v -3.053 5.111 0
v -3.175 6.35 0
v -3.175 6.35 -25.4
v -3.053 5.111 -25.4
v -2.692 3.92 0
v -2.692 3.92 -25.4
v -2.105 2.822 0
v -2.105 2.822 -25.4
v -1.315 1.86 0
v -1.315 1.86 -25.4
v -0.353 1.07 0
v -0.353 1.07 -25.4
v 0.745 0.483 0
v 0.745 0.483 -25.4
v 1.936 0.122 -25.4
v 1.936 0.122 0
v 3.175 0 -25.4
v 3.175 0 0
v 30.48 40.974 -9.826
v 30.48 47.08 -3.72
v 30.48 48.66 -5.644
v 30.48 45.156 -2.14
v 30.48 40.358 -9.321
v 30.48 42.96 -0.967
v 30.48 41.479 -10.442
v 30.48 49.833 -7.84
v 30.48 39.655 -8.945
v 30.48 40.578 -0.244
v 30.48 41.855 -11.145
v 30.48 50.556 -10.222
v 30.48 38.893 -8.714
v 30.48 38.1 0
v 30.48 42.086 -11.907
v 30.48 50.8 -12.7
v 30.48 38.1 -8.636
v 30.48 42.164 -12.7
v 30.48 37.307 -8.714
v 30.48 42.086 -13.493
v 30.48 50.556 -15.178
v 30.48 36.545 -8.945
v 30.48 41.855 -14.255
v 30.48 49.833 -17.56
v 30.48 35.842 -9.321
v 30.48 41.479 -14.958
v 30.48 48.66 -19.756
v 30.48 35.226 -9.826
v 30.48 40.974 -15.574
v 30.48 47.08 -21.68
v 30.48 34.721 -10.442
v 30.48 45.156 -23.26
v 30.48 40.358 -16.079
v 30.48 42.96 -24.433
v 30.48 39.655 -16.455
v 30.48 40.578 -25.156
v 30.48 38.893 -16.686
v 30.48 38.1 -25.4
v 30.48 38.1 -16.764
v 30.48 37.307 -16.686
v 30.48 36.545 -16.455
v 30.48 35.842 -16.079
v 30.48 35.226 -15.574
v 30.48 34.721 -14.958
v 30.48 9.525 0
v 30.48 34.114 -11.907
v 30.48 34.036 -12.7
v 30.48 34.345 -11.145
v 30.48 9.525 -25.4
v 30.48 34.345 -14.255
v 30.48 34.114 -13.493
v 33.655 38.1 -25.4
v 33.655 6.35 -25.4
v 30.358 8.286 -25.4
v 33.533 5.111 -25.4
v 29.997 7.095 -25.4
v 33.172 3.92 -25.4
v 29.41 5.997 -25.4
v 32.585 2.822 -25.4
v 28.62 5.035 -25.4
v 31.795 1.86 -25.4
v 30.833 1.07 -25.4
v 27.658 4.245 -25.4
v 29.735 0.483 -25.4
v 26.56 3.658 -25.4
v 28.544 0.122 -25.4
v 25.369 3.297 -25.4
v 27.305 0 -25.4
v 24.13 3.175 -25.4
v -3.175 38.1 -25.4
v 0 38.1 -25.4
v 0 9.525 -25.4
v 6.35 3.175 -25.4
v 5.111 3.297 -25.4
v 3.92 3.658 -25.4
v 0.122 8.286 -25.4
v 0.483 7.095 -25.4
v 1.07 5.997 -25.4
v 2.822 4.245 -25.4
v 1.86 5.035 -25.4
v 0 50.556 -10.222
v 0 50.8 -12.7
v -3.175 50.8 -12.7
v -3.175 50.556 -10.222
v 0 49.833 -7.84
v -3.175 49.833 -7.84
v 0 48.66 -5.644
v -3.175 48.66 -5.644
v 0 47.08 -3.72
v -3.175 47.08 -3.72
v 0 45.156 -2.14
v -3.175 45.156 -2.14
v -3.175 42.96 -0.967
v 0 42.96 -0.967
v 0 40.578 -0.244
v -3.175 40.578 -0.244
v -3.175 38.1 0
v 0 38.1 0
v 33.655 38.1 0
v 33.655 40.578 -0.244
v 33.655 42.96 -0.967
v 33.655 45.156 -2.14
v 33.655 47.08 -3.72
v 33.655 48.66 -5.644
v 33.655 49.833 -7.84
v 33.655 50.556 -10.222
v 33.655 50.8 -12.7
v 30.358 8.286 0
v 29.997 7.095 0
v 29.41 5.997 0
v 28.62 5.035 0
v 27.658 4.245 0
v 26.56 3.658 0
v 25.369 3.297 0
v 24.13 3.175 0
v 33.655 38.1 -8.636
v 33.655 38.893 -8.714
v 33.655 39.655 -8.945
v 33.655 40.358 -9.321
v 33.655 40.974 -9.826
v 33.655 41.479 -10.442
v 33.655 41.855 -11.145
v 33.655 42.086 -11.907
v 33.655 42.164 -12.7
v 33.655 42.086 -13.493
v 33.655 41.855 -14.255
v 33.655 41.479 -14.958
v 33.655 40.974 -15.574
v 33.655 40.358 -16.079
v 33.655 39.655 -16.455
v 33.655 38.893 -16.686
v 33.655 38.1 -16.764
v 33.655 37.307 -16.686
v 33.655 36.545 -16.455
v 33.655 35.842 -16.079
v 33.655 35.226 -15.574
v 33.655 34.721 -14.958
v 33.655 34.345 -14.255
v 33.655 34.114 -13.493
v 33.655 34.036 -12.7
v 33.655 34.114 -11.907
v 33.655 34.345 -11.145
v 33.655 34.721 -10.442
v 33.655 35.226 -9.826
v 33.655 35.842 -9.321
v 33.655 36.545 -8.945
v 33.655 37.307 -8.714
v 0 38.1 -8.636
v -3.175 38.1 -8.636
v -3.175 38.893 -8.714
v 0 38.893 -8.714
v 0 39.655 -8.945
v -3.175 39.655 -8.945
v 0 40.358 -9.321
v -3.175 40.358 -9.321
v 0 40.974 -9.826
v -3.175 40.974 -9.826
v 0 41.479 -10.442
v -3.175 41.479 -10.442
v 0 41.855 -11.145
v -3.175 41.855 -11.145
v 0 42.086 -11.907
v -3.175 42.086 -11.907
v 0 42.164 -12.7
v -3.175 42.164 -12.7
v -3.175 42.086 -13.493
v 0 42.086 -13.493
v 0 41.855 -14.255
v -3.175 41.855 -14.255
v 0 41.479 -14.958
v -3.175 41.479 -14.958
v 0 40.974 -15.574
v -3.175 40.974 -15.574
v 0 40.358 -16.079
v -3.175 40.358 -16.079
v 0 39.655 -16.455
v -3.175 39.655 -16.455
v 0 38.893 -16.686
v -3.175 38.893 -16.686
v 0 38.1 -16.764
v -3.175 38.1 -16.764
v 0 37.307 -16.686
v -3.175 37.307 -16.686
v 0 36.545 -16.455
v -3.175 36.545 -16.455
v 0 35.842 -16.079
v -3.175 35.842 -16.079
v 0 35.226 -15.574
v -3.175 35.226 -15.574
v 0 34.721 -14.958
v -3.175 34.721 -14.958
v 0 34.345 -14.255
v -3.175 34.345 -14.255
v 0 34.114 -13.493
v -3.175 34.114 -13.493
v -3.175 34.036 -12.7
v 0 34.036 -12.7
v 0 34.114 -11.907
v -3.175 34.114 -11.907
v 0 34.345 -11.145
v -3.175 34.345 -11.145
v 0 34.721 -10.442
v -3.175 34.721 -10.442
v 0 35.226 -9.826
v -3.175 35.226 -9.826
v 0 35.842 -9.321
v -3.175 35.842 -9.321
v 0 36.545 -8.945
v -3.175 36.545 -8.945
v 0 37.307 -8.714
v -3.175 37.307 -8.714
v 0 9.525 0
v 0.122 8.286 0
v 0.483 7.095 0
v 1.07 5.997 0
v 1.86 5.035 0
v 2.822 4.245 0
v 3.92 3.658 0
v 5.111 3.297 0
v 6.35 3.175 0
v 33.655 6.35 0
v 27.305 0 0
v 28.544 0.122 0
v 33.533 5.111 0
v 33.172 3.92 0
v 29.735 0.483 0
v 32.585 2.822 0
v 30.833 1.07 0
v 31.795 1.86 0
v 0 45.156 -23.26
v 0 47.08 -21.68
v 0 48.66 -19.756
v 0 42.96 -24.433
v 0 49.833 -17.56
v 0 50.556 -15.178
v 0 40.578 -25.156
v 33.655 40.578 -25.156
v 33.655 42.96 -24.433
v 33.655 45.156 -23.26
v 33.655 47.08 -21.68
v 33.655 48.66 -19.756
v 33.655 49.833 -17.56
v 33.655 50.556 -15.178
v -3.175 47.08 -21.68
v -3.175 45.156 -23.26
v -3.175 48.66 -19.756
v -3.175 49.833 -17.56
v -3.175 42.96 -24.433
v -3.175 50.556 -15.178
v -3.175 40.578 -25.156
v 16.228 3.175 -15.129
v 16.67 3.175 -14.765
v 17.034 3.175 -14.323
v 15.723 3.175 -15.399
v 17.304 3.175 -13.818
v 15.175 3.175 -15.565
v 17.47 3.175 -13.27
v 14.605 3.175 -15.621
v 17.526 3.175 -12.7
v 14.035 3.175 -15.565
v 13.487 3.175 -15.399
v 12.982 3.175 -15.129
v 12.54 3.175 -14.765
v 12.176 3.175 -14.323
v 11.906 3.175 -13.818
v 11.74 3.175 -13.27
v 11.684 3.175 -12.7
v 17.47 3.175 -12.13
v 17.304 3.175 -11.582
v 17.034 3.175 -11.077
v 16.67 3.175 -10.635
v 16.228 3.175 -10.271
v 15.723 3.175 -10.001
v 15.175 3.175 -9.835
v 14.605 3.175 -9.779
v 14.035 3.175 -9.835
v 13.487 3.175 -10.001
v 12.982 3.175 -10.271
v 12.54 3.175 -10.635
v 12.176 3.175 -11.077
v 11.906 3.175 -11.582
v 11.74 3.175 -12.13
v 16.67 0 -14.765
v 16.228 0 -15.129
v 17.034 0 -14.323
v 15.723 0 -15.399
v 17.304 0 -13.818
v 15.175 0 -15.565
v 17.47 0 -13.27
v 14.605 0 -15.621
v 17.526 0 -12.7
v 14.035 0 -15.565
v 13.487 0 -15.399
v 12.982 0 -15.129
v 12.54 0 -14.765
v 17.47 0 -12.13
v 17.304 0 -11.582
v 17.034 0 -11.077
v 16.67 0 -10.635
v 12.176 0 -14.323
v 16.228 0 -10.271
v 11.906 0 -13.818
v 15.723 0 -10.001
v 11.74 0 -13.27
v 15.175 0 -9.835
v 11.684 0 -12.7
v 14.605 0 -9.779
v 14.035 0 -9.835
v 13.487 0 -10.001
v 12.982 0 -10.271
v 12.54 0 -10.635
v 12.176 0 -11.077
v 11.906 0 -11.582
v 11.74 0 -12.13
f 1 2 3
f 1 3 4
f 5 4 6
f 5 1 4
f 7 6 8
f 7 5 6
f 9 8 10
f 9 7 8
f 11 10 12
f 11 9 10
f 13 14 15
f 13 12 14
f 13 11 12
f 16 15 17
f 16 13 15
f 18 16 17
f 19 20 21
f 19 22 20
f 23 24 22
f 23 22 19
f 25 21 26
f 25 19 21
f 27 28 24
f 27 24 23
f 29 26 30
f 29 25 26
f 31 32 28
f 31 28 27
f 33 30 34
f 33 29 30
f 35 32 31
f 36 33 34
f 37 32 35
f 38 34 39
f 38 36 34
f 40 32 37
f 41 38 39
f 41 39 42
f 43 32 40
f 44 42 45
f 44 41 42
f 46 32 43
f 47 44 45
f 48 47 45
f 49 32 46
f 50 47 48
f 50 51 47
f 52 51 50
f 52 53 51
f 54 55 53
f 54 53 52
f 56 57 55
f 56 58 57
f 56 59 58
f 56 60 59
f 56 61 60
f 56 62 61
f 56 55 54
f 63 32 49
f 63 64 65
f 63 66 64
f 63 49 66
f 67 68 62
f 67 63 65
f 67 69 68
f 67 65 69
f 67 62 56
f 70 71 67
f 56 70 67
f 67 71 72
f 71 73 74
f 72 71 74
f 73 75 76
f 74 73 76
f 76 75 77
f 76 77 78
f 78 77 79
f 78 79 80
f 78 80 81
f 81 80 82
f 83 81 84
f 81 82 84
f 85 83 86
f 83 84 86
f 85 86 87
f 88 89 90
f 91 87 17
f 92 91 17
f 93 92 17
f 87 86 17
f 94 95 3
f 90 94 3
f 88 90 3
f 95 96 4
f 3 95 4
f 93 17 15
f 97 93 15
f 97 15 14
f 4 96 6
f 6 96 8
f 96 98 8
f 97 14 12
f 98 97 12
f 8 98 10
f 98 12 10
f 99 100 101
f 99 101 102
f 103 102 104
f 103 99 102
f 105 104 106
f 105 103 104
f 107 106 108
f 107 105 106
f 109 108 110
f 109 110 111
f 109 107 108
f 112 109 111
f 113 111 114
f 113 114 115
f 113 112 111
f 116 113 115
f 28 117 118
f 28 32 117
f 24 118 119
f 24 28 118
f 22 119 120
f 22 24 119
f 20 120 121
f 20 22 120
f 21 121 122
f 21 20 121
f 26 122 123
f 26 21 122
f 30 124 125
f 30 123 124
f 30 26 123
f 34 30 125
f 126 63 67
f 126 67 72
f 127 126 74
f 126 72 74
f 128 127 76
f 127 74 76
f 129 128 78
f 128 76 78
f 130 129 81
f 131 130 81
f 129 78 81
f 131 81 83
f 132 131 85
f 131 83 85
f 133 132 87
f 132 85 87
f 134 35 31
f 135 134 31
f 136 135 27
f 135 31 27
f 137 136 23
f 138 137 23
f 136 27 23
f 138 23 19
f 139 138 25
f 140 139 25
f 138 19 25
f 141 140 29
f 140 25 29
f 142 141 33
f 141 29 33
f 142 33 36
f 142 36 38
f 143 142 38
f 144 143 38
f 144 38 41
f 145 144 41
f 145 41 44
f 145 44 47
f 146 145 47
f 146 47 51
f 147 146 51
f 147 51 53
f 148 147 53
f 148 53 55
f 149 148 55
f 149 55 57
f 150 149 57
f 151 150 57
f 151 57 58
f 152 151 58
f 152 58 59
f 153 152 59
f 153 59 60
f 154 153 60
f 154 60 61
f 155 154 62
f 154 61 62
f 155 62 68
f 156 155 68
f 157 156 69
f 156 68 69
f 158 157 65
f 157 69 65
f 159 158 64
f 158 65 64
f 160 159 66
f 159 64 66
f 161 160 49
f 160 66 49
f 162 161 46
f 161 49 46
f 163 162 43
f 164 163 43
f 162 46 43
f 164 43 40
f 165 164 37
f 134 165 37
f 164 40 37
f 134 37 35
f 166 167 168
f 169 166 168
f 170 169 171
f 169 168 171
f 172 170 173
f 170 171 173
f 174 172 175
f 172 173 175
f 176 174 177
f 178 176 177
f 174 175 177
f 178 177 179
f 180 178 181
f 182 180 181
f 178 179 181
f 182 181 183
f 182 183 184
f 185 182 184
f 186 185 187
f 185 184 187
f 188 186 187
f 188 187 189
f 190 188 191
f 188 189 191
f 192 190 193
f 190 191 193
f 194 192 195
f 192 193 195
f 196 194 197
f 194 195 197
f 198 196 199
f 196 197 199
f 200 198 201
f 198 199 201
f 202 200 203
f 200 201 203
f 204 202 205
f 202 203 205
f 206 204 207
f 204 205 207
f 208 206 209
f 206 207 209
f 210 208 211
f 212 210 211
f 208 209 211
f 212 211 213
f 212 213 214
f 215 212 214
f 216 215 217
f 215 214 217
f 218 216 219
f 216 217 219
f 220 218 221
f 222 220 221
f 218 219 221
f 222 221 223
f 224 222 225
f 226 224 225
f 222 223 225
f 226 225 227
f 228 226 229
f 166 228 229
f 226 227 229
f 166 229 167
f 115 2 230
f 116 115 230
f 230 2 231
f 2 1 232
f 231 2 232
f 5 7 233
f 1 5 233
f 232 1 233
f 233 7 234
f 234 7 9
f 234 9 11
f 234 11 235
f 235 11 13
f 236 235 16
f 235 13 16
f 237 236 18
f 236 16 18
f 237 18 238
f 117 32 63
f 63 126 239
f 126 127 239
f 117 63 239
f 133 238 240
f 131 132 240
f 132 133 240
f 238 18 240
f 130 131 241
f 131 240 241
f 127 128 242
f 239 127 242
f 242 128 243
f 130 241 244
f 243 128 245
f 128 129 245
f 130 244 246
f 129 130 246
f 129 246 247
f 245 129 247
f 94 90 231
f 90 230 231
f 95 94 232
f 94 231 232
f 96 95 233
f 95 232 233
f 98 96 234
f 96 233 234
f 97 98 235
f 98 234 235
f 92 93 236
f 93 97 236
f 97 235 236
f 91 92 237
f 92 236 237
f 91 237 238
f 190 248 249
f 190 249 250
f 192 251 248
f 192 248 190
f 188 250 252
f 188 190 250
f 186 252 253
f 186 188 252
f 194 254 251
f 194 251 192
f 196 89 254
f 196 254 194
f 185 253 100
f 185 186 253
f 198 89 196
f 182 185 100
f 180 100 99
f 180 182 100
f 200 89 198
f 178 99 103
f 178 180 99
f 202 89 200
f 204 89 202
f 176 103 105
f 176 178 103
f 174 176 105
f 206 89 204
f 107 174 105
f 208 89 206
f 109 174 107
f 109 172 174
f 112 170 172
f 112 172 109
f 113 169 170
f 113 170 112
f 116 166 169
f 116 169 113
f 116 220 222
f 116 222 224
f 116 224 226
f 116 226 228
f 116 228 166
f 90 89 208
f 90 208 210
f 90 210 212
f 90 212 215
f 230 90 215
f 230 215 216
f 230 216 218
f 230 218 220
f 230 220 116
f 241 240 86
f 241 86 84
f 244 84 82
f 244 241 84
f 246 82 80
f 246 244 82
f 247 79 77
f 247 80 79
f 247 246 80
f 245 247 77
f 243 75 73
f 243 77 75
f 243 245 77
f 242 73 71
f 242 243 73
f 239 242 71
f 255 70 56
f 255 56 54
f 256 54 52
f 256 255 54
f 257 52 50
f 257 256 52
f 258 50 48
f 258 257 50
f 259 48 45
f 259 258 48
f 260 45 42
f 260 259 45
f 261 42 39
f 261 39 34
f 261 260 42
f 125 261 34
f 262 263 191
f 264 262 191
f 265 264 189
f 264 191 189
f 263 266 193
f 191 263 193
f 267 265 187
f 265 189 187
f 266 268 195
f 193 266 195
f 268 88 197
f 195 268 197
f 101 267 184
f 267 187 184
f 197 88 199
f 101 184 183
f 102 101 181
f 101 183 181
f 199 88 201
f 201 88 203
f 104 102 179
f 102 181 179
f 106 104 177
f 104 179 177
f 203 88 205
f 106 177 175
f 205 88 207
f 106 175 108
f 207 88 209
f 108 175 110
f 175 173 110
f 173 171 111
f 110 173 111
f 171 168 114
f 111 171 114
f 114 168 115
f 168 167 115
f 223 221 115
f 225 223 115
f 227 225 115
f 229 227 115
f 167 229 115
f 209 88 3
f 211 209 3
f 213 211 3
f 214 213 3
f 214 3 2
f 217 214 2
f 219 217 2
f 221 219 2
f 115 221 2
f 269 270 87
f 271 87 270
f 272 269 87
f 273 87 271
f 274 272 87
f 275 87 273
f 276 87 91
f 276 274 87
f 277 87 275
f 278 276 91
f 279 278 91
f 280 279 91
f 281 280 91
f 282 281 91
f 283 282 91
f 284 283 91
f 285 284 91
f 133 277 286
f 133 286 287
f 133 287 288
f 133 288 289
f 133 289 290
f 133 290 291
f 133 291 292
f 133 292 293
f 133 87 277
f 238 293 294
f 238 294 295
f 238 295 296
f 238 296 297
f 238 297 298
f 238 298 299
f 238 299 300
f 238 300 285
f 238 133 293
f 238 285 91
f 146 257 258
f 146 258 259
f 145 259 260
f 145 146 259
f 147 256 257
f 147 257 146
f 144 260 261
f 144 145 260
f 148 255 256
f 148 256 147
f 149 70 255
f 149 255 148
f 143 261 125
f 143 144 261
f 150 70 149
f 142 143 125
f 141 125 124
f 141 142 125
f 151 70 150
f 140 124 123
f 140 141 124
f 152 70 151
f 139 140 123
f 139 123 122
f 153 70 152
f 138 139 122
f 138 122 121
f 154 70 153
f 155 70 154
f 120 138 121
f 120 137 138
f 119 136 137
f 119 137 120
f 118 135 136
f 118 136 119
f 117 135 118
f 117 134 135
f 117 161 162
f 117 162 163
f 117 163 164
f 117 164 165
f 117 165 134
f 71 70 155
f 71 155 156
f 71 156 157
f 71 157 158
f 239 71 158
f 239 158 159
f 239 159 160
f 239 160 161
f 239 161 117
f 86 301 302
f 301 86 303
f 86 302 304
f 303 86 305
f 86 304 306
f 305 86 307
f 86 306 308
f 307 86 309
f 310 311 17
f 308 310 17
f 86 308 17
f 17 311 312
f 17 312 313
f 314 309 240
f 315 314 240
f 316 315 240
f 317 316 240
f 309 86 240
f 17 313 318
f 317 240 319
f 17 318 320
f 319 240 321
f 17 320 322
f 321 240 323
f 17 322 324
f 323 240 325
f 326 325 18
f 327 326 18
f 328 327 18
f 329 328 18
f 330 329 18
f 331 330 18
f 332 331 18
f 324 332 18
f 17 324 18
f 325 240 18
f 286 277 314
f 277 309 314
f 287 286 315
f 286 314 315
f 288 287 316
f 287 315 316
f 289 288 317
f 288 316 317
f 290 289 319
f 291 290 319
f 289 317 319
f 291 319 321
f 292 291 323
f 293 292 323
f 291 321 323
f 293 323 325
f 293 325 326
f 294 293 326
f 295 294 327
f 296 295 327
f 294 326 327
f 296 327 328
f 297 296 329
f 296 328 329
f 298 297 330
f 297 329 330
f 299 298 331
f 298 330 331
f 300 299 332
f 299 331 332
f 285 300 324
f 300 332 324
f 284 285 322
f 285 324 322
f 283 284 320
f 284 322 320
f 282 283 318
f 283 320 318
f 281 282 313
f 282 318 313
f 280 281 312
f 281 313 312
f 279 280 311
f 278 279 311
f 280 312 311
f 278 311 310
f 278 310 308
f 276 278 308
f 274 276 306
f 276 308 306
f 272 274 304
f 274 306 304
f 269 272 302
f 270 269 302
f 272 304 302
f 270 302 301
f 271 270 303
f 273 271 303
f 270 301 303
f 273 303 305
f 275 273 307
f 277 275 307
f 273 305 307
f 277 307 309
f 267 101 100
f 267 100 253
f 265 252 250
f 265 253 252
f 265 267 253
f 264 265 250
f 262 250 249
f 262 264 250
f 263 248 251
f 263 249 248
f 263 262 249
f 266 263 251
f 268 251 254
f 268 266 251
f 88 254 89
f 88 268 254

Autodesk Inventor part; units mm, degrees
ref_plane "YZ Plane" through (0, 0, 0) normal (1, 0, 0) x (0, 1, 0)
ref_plane "XZ Plane" through (0, 0, 0) normal (0, 1, 0) x (-1, 0, 0)
ref_plane "XY Plane" through (0, 0, 0) normal (0, 0, 1) x (1, 0, 0)
sketch "Sketch1" plane through (0, 0, 0) normal (0, 1, 0) x (-1, 0, 0)
  line L0 (0, 0) -> (-30.48, 0)
  line L1 (-30.48, 0) -> (-30.48, -25.4)
  line L2 (-30.48, -25.4) -> (0, -25.4)
  line L3 (0, -25.4) -> (0, 0)
  line L4 (0, -25.4) -> (3.175, -25.4)
  line L5 (3.175, -25.4) -> (3.175, 0)
  line L6 (3.175, 0) -> (0, 0)
  line L7 (0, 0) -> (0, -25.4)
  line L8 (-30.48, -25.4) -> (-33.655, -25.4)
  line L9 (-33.655, -25.4) -> (-33.655, 0)
  line L10 (-33.655, 0) -> (-30.48, 0)
  line L11 (-30.48, 0) -> (-30.48, -25.4)
  dimension "d0" = 30.48
  dimension "d1" = 25.4
  dimension "d2" = 3.175
  dimension "d3" = 3.175
extrude "Extrusion1" add sketch "Sketch1" along normal blind 3.175 contours L3 L2 L1 L0
extrude "Extrusion2" add sketch "Sketch1" along normal blind 50.8 contours L6 L5 L4 L3 | L1 L8 L9 L10
sketch "Sketch2" plane through (-3.175, 0, -25.4) normal (-1, 0, 0) x (0, 0, 1)
  circle A0 centre (12.7, 38.1) radius 4.064
  line L0 (0, 50.8) -> (25.4, 50.8) projected
  line L1 (12.7, 38.1) -> (0, 38.1) construction
  line L2 (12.7, 38.1) -> (25.4, 38.1) construction
  point P0 (25.4, 0)
  dimension "d8" = 8.128
  dimension "d9" = 12.7
extrude "Extrusion3" cut sketch "Sketch2" against normal through all
fillet "Fillet1" radius 12.7 4 edges at (-1.5875, 50.8, 0) (32.0675, 50.8, 0) (32.0675, 50.8, -25.4) (-1.5875, 50.8, -25.4)
fillet "Fillet2" radius 6.35 4 edges at (-3.175, 0, -12.7) (0, 3.175, -12.7) (30.48, 3.175, -12.7) (33.655, 0, -12.7)
sketch "Sketch3" plane through (0, 0, 0) normal (0, -1, 0) x (1, 0, 0)
  circle A0 centre (14.605, -12.7) radius 2.921
  line L0 (14.605, -12.7) -> (1.905, -12.7) construction
  line L1 (27.305, 0) -> (27.305, -25.4) construction
  line L2 (3.175, 0) -> (27.305, 0) construction
  line L3 (3.175, -25.4) -> (3.175, 0) construction
  line L4 (27.305, -25.4) -> (3.175, -25.4) construction
  line L5 (14.605, -12.7) -> (27.305, -12.7) construction
  line L6 (14.605, -12.7) -> (14.605, 0) construction
  line L7 (14.605, -12.7) -> (14.605, -25.4) construction
  point P0 (0, 0)
  dimension "d14" = 5.842
extrude "Extrusion4" cut sketch "Sketch3" against normal through all
properties part number "MainMount" material "ABS Plastic"
